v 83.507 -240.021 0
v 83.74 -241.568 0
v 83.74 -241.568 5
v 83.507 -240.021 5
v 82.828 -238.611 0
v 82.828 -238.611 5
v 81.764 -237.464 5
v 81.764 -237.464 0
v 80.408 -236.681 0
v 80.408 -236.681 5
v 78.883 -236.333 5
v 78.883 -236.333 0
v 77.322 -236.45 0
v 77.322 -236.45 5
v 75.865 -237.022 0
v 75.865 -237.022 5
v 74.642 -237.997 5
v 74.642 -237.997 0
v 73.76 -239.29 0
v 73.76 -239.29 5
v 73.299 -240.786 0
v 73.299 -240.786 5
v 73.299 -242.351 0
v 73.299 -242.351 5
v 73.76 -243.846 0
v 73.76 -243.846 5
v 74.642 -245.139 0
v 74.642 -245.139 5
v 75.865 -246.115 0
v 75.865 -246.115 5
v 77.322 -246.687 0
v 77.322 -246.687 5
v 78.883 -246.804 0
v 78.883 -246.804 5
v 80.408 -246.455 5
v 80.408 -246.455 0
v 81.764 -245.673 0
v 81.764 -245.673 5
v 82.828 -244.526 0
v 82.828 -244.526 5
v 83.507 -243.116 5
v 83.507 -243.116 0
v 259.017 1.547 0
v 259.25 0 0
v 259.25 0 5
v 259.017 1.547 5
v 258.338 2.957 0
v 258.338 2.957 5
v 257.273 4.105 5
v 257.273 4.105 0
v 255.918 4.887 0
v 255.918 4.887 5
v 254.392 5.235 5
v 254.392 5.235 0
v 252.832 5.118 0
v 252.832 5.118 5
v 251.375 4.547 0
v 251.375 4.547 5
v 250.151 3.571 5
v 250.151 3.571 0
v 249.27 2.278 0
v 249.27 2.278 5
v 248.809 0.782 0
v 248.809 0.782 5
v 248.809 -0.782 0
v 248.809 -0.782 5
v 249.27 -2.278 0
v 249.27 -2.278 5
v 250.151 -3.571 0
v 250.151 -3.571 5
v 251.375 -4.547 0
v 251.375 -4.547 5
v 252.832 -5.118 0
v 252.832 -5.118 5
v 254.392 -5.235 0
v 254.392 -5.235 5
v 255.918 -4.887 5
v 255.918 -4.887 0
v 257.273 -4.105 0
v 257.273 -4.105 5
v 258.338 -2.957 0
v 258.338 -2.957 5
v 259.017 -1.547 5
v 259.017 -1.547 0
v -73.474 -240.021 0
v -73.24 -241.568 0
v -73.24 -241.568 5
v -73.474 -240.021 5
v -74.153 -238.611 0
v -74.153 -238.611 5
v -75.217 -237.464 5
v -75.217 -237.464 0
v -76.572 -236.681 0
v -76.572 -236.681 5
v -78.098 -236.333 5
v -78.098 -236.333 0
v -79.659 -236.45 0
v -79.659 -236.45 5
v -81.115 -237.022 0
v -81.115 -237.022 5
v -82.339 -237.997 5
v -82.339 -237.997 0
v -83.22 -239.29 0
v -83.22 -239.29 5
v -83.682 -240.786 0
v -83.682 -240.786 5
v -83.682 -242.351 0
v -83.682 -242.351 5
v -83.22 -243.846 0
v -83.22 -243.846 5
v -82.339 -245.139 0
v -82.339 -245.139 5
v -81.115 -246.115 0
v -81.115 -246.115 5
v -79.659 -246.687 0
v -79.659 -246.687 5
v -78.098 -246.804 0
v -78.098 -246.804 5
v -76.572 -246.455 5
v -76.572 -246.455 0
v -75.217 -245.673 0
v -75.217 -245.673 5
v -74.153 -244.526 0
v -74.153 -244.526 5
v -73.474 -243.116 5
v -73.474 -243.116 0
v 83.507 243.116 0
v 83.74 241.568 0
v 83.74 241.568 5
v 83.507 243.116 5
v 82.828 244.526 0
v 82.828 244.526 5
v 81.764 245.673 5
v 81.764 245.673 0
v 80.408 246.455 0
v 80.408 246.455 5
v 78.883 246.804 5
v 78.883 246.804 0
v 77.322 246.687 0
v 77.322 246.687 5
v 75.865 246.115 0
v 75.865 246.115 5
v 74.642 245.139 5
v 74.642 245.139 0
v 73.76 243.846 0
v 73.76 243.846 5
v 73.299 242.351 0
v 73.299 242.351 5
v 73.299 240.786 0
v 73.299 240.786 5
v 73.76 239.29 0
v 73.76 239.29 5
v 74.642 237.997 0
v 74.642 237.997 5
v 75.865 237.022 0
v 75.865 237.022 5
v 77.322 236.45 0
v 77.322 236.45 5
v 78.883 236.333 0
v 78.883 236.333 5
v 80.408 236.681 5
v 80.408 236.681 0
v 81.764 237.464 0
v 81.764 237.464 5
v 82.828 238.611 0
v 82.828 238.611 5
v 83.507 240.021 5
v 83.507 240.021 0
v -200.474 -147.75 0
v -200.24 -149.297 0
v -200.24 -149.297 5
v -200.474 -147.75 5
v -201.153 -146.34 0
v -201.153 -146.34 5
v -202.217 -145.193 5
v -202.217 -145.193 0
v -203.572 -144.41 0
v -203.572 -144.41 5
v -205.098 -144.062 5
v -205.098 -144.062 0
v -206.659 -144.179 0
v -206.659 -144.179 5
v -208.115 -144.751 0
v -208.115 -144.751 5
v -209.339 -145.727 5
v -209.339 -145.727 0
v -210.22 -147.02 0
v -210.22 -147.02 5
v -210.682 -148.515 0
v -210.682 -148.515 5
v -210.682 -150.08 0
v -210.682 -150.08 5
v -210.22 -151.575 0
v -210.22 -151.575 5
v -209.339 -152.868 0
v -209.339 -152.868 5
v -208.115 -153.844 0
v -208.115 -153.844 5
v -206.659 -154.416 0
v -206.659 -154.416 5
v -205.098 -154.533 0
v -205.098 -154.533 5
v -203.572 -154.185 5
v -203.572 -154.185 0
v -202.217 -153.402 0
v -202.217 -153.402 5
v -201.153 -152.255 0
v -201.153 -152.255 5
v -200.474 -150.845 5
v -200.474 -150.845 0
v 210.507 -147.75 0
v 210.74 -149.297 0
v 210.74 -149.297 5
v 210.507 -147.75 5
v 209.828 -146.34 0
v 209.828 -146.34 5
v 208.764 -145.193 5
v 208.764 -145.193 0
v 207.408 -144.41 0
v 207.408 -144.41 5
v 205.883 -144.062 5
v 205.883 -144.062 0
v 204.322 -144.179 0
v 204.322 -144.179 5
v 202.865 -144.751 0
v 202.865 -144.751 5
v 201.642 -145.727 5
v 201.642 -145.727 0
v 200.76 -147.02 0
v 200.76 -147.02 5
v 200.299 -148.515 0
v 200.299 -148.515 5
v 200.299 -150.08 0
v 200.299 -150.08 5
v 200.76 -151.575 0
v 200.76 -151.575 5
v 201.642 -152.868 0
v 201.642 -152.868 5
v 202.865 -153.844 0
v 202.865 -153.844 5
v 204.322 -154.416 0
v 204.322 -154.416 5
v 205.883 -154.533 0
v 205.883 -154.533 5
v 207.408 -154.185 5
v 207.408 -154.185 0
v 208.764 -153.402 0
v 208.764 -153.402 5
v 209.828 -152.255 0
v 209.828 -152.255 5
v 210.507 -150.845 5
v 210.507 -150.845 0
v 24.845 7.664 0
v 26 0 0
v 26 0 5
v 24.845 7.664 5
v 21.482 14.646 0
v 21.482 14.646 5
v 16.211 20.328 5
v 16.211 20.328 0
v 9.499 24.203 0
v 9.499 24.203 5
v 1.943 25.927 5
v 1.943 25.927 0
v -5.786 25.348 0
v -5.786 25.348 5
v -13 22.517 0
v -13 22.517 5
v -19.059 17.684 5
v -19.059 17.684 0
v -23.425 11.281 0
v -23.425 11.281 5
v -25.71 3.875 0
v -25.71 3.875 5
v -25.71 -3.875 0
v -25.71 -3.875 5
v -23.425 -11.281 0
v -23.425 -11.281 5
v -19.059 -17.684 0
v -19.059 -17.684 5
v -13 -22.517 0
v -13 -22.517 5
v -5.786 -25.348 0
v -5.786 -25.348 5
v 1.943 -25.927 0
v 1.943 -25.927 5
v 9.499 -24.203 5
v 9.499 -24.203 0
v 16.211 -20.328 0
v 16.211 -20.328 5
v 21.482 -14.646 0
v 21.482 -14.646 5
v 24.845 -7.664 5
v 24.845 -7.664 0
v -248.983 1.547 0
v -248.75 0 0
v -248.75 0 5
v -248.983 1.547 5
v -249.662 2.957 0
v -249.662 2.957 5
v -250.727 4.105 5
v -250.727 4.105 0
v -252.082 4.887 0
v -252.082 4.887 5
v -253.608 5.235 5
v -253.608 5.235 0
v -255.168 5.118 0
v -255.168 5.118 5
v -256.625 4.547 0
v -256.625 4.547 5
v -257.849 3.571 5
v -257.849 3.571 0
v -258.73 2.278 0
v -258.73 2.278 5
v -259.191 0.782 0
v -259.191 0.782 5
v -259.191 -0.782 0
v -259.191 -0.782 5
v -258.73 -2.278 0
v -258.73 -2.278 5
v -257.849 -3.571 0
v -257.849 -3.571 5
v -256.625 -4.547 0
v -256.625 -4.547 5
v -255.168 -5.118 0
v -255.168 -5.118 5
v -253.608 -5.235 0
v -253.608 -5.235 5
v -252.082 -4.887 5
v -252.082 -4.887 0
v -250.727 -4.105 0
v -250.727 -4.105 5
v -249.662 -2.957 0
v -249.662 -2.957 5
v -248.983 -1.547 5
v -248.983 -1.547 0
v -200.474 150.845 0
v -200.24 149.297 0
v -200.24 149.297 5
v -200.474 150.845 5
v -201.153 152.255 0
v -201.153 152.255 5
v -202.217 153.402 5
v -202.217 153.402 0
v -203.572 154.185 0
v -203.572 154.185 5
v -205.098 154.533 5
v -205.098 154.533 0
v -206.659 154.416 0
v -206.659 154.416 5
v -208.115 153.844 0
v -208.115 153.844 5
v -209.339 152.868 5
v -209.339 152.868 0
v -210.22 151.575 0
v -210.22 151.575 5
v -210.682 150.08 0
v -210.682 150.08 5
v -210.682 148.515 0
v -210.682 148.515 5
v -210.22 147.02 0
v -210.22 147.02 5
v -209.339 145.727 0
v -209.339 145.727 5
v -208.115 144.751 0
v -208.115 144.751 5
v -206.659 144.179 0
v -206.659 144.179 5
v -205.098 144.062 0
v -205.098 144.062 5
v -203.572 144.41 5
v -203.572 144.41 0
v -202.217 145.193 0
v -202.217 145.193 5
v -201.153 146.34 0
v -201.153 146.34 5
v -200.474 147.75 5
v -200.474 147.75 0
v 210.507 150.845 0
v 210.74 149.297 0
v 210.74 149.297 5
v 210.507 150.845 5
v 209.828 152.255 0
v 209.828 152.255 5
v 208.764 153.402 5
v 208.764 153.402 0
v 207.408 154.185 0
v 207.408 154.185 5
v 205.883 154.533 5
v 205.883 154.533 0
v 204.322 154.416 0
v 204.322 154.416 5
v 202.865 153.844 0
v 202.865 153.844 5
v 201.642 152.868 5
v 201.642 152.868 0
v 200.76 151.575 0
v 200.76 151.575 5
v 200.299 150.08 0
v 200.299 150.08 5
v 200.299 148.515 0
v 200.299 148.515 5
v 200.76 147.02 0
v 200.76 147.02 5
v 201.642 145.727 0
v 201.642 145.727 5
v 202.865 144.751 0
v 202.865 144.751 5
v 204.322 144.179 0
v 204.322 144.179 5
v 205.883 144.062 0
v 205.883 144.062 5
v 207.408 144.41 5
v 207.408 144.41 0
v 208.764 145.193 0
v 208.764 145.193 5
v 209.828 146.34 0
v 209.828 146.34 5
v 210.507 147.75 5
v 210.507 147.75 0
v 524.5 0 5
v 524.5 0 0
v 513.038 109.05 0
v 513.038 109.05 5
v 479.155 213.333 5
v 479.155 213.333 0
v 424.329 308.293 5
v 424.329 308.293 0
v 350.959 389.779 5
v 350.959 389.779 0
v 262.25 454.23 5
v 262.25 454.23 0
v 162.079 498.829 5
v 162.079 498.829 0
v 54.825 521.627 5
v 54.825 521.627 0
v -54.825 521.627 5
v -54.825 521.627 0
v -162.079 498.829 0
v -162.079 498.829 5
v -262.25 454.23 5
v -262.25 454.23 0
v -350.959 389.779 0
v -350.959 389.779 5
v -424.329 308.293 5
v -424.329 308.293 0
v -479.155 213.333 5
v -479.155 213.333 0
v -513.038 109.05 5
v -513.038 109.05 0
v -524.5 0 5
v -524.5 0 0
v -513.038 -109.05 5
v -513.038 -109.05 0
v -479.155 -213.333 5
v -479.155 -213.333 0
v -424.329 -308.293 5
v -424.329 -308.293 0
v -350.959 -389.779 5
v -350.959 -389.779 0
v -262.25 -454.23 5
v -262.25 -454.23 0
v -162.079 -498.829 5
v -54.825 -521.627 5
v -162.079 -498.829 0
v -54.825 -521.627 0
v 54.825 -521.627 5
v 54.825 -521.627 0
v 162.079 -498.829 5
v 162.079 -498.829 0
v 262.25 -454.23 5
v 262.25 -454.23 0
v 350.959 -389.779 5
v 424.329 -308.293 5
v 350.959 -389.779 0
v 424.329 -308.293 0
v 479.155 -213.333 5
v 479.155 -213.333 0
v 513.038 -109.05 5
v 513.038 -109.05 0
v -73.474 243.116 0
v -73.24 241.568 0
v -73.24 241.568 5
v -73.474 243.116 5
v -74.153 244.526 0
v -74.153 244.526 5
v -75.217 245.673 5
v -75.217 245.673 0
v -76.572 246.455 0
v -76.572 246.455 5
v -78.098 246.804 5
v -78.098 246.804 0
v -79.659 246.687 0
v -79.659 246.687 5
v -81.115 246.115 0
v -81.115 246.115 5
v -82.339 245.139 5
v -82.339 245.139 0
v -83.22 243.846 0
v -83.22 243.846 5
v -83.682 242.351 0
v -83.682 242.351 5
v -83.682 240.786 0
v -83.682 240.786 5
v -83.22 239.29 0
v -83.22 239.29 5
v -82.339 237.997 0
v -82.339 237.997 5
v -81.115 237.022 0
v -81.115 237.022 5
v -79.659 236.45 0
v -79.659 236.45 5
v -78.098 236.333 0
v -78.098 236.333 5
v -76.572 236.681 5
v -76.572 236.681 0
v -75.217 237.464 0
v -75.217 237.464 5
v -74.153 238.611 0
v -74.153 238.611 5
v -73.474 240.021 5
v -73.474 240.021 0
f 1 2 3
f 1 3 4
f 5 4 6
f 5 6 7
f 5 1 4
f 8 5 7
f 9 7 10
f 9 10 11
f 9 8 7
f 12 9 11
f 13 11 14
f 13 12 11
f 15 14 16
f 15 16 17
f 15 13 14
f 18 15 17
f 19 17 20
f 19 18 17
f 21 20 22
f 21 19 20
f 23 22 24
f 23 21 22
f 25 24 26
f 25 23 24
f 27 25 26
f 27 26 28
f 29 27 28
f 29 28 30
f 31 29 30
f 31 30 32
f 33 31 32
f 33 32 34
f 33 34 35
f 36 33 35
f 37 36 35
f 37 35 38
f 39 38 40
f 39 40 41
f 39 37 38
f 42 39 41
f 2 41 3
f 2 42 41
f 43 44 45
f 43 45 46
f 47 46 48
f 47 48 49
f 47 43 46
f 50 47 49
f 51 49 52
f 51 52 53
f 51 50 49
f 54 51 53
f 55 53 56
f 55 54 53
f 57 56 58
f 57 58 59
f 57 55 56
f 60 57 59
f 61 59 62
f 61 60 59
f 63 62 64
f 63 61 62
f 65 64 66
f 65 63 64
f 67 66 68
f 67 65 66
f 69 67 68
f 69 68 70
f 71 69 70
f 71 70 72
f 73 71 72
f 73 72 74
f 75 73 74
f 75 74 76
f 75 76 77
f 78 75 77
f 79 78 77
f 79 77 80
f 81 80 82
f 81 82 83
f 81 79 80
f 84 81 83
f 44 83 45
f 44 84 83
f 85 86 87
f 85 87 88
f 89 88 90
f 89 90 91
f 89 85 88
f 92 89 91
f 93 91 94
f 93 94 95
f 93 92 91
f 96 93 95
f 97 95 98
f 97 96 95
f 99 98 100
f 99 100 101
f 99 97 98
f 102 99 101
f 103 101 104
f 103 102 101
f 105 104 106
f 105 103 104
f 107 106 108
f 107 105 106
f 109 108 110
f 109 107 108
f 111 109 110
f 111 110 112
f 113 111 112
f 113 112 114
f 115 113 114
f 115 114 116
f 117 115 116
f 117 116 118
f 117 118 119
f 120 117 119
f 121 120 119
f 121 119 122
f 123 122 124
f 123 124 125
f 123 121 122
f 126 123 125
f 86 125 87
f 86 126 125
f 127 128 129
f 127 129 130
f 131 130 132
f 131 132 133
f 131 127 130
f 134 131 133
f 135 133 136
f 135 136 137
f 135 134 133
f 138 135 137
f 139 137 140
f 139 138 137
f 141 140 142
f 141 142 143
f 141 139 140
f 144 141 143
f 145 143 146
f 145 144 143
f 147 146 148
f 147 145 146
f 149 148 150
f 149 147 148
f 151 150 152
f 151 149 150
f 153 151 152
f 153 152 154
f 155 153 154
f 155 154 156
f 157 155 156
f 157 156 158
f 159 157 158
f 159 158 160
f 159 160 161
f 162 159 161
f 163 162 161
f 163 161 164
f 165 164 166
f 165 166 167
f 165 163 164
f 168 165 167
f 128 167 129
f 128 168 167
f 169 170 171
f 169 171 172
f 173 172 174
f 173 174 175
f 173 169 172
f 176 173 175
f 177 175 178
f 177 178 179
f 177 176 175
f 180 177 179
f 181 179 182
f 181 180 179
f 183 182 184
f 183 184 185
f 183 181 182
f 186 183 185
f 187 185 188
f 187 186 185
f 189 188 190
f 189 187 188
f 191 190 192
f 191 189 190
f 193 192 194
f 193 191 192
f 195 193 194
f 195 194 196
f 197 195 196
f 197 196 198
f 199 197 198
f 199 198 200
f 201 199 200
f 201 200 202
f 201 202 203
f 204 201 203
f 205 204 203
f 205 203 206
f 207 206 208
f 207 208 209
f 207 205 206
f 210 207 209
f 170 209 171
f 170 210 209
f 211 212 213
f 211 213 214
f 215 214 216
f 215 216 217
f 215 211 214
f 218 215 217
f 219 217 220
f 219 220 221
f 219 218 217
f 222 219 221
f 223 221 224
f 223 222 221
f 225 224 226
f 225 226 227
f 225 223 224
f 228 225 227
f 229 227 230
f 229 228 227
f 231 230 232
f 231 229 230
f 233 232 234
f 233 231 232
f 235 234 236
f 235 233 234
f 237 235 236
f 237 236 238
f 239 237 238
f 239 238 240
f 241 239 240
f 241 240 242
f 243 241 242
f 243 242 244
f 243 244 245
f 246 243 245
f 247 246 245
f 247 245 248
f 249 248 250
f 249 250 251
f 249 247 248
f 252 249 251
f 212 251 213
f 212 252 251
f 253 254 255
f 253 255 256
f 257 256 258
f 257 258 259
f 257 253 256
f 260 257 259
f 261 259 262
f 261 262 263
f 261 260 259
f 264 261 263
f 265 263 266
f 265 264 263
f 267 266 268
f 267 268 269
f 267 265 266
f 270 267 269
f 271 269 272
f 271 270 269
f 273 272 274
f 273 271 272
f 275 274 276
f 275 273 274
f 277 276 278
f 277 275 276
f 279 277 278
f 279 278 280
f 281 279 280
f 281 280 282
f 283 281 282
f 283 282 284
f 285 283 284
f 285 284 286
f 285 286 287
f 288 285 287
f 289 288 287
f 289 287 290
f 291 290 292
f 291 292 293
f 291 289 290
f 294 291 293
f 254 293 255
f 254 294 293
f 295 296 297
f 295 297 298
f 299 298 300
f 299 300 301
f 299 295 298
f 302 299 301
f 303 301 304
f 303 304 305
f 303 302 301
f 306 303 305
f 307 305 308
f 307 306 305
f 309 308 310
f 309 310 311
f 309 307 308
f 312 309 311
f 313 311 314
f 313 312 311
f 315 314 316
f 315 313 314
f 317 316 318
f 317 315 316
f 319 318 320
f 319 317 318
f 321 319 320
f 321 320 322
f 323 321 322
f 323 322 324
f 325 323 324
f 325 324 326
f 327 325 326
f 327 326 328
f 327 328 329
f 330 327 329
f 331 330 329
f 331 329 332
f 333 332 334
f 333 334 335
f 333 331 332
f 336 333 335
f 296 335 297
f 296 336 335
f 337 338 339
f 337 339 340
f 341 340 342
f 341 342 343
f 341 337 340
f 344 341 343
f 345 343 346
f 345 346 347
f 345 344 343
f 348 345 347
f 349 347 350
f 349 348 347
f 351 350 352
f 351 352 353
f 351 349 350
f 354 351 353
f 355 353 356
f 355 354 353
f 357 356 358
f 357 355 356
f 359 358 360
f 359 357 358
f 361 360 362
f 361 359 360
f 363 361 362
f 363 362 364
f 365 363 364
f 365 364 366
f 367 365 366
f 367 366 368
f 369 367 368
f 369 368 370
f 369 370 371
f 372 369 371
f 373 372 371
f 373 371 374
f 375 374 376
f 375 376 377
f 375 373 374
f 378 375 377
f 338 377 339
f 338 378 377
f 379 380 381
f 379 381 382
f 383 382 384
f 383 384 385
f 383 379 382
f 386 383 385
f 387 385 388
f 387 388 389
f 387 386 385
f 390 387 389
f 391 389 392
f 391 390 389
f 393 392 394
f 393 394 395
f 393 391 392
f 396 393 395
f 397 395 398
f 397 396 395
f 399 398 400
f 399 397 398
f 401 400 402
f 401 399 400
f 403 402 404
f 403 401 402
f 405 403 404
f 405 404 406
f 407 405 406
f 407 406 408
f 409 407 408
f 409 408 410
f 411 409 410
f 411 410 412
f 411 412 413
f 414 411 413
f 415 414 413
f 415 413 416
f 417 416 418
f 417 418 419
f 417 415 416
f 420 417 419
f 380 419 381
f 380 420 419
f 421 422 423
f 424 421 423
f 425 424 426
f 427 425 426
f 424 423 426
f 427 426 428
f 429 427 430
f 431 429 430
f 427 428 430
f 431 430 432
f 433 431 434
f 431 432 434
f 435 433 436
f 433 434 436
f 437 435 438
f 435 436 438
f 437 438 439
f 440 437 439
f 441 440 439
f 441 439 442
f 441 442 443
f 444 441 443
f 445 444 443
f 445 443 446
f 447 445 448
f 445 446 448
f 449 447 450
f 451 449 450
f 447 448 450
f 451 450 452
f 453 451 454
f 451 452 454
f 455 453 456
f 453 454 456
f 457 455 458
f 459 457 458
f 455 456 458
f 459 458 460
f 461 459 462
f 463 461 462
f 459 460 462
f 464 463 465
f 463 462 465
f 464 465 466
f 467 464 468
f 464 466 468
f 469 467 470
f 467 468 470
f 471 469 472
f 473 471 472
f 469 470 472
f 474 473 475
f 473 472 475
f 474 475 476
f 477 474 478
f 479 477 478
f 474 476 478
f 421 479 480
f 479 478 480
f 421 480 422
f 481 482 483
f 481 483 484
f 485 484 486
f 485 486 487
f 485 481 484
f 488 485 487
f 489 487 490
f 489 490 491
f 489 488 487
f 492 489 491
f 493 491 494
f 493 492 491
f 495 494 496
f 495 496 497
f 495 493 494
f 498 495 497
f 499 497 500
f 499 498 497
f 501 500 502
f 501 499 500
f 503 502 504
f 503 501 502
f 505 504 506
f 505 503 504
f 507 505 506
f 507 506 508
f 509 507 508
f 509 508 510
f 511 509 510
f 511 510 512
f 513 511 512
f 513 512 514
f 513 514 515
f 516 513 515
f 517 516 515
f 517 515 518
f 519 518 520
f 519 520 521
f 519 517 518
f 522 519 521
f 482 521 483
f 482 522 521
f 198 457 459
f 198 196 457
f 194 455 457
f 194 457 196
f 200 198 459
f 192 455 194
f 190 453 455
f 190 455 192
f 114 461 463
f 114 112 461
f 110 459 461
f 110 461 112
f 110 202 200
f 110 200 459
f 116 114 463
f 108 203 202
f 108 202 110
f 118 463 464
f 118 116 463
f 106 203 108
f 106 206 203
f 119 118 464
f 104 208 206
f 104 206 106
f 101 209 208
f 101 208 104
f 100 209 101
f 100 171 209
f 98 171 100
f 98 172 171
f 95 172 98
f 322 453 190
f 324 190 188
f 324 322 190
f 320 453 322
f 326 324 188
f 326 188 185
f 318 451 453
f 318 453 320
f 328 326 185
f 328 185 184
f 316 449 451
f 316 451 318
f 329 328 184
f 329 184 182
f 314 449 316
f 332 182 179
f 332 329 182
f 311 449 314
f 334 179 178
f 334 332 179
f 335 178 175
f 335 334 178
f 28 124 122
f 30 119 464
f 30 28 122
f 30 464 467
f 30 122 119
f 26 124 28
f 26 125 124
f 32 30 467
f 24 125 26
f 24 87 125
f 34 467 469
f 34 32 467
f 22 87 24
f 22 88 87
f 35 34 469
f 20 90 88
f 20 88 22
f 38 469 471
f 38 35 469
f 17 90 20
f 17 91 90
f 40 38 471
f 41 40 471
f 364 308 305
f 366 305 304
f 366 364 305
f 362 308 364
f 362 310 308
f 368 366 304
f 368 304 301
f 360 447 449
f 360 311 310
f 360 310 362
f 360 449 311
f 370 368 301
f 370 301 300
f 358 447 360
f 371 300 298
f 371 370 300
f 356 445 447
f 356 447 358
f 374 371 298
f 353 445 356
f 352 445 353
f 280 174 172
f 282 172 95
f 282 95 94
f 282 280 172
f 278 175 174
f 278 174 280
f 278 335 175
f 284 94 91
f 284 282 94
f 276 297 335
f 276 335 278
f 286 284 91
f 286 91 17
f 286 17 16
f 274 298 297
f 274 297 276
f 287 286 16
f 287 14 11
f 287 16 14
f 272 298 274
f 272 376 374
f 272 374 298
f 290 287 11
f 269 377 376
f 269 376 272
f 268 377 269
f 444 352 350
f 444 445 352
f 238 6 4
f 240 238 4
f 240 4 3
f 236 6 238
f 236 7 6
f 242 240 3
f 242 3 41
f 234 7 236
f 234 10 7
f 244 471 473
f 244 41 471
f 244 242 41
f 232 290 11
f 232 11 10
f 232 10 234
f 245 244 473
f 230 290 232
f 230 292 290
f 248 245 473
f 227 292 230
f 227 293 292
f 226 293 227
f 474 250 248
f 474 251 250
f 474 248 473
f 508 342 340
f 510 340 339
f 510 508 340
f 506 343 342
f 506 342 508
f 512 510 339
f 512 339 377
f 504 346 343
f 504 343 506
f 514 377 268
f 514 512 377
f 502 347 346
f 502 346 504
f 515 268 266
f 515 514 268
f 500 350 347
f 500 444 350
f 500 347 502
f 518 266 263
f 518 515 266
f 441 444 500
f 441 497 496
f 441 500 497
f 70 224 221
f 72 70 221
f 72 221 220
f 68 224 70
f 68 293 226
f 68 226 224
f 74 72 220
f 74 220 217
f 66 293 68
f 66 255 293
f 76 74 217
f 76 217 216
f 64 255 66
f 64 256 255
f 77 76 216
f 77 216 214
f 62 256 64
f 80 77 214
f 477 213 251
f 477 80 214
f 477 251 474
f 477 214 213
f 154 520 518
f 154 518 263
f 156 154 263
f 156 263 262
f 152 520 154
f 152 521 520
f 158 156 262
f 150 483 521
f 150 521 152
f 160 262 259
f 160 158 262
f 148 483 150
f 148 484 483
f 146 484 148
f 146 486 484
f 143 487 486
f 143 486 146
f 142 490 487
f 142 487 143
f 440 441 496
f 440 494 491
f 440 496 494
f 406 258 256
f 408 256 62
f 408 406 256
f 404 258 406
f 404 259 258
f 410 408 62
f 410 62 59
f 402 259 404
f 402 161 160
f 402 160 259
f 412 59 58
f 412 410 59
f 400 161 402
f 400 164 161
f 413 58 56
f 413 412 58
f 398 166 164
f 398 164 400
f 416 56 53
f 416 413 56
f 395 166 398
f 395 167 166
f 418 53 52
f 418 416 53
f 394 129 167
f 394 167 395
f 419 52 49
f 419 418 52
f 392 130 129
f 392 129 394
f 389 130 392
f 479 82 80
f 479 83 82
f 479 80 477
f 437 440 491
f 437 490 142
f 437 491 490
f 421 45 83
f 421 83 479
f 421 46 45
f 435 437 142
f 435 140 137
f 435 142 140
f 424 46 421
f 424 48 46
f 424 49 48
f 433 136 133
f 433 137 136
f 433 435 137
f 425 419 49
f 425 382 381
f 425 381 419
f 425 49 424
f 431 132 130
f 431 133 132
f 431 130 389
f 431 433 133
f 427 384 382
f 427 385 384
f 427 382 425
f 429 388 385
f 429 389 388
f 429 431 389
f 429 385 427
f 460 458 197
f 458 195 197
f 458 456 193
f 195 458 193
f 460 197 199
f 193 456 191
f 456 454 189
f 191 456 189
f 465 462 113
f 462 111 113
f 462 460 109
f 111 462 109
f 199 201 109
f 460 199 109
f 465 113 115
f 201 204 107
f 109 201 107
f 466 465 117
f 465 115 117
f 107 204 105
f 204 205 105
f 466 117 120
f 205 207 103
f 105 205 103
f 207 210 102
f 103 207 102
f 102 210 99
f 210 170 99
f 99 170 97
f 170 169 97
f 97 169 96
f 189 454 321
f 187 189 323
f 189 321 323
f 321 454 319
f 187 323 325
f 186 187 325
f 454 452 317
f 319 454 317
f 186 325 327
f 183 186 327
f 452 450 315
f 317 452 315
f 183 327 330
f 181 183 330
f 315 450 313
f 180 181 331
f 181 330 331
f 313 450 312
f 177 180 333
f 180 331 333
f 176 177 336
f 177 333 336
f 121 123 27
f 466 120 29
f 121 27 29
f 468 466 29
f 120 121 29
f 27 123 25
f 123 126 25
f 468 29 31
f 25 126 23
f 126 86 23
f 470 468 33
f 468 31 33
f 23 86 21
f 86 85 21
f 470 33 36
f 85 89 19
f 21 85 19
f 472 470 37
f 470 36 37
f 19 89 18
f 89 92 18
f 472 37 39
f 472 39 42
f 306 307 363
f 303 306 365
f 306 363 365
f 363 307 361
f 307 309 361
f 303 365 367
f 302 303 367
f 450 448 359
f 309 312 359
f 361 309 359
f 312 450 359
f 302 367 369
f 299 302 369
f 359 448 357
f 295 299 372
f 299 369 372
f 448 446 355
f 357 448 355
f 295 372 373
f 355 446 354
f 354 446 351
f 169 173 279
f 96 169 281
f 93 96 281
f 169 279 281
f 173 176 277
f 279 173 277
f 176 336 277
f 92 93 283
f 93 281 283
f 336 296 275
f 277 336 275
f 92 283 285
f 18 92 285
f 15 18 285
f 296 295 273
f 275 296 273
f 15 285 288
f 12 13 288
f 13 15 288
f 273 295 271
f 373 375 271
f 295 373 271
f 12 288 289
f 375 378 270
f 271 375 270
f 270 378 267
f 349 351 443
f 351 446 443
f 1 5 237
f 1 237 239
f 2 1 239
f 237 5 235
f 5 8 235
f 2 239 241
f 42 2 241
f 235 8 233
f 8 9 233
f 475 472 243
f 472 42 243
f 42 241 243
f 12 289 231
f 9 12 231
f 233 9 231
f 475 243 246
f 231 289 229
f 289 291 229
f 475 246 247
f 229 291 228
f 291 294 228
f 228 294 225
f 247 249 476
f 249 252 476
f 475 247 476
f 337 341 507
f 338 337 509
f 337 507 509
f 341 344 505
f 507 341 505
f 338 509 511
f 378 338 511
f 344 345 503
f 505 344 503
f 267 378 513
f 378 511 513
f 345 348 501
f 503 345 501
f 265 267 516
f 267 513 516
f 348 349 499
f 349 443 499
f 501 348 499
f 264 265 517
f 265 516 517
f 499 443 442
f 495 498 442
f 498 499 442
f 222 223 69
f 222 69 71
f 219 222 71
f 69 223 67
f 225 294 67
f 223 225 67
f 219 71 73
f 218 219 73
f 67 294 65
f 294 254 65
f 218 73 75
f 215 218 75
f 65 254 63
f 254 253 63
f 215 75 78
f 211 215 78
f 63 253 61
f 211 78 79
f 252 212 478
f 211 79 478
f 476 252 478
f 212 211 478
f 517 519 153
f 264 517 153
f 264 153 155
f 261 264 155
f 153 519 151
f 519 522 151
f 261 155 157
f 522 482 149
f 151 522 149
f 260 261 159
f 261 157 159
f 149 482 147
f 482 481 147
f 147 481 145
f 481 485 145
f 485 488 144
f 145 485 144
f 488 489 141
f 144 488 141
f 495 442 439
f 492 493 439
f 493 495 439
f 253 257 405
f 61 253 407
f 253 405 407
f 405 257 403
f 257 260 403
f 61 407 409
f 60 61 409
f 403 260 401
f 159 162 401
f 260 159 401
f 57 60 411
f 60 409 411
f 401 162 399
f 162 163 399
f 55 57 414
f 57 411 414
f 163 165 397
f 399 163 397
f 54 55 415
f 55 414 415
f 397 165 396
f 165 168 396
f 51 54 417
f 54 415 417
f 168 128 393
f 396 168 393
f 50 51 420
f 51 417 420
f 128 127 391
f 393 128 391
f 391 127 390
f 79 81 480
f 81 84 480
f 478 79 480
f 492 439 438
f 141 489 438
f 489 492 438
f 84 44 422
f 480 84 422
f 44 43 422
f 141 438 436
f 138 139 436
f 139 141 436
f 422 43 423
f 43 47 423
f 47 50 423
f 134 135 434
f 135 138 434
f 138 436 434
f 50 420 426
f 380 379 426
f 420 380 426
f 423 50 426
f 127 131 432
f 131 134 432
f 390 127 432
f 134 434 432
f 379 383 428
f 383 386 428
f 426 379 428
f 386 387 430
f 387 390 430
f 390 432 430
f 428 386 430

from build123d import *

# Parameters (mm, degrees)
F0_R     = 524.5
F0_R_2   = 5.25
F0_R_3   = 26
F1_DEPTH = 5


with BuildPart() as f1:
    # F0 (on Top) → F1 (new body)
    with BuildSketch(Plane.XY):
        Circle(F0_R)
        with Locations((-205.490317, -149.297454)):
            Circle(F0_R_2, mode=Mode.SUBTRACT)
        with Locations((-78.490317, -241.568355)):
            Circle(F0_R_2, mode=Mode.SUBTRACT)
        with Locations((78.490317, -241.568355)):
            Circle(F0_R_2, mode=Mode.SUBTRACT)
        with Locations((205.490317, -149.297454)):
            Circle(F0_R_2, mode=Mode.SUBTRACT)
        with Locations((-254, 0)):
            Circle(F0_R_2, mode=Mode.SUBTRACT)
        with Locations((-205.490317, 149.297454)):
            Circle(F0_R_2, mode=Mode.SUBTRACT)
        with Locations((-78.490317, 241.568355)):
            Circle(F0_R_2, mode=Mode.SUBTRACT)
        Circle(F0_R_3, mode=Mode.SUBTRACT)
        with Locations((254, 0)):
            Circle(F0_R_2, mode=Mode.SUBTRACT)
        with Locations((78.490317, 241.568355)):
            Circle(F0_R_2, mode=Mode.SUBTRACT)
        with Locations((205.490317, 149.297454)):
            Circle(F0_R_2, mode=Mode.SUBTRACT)
    extrude(amount=F1_DEPTH)


solid = f1.part
